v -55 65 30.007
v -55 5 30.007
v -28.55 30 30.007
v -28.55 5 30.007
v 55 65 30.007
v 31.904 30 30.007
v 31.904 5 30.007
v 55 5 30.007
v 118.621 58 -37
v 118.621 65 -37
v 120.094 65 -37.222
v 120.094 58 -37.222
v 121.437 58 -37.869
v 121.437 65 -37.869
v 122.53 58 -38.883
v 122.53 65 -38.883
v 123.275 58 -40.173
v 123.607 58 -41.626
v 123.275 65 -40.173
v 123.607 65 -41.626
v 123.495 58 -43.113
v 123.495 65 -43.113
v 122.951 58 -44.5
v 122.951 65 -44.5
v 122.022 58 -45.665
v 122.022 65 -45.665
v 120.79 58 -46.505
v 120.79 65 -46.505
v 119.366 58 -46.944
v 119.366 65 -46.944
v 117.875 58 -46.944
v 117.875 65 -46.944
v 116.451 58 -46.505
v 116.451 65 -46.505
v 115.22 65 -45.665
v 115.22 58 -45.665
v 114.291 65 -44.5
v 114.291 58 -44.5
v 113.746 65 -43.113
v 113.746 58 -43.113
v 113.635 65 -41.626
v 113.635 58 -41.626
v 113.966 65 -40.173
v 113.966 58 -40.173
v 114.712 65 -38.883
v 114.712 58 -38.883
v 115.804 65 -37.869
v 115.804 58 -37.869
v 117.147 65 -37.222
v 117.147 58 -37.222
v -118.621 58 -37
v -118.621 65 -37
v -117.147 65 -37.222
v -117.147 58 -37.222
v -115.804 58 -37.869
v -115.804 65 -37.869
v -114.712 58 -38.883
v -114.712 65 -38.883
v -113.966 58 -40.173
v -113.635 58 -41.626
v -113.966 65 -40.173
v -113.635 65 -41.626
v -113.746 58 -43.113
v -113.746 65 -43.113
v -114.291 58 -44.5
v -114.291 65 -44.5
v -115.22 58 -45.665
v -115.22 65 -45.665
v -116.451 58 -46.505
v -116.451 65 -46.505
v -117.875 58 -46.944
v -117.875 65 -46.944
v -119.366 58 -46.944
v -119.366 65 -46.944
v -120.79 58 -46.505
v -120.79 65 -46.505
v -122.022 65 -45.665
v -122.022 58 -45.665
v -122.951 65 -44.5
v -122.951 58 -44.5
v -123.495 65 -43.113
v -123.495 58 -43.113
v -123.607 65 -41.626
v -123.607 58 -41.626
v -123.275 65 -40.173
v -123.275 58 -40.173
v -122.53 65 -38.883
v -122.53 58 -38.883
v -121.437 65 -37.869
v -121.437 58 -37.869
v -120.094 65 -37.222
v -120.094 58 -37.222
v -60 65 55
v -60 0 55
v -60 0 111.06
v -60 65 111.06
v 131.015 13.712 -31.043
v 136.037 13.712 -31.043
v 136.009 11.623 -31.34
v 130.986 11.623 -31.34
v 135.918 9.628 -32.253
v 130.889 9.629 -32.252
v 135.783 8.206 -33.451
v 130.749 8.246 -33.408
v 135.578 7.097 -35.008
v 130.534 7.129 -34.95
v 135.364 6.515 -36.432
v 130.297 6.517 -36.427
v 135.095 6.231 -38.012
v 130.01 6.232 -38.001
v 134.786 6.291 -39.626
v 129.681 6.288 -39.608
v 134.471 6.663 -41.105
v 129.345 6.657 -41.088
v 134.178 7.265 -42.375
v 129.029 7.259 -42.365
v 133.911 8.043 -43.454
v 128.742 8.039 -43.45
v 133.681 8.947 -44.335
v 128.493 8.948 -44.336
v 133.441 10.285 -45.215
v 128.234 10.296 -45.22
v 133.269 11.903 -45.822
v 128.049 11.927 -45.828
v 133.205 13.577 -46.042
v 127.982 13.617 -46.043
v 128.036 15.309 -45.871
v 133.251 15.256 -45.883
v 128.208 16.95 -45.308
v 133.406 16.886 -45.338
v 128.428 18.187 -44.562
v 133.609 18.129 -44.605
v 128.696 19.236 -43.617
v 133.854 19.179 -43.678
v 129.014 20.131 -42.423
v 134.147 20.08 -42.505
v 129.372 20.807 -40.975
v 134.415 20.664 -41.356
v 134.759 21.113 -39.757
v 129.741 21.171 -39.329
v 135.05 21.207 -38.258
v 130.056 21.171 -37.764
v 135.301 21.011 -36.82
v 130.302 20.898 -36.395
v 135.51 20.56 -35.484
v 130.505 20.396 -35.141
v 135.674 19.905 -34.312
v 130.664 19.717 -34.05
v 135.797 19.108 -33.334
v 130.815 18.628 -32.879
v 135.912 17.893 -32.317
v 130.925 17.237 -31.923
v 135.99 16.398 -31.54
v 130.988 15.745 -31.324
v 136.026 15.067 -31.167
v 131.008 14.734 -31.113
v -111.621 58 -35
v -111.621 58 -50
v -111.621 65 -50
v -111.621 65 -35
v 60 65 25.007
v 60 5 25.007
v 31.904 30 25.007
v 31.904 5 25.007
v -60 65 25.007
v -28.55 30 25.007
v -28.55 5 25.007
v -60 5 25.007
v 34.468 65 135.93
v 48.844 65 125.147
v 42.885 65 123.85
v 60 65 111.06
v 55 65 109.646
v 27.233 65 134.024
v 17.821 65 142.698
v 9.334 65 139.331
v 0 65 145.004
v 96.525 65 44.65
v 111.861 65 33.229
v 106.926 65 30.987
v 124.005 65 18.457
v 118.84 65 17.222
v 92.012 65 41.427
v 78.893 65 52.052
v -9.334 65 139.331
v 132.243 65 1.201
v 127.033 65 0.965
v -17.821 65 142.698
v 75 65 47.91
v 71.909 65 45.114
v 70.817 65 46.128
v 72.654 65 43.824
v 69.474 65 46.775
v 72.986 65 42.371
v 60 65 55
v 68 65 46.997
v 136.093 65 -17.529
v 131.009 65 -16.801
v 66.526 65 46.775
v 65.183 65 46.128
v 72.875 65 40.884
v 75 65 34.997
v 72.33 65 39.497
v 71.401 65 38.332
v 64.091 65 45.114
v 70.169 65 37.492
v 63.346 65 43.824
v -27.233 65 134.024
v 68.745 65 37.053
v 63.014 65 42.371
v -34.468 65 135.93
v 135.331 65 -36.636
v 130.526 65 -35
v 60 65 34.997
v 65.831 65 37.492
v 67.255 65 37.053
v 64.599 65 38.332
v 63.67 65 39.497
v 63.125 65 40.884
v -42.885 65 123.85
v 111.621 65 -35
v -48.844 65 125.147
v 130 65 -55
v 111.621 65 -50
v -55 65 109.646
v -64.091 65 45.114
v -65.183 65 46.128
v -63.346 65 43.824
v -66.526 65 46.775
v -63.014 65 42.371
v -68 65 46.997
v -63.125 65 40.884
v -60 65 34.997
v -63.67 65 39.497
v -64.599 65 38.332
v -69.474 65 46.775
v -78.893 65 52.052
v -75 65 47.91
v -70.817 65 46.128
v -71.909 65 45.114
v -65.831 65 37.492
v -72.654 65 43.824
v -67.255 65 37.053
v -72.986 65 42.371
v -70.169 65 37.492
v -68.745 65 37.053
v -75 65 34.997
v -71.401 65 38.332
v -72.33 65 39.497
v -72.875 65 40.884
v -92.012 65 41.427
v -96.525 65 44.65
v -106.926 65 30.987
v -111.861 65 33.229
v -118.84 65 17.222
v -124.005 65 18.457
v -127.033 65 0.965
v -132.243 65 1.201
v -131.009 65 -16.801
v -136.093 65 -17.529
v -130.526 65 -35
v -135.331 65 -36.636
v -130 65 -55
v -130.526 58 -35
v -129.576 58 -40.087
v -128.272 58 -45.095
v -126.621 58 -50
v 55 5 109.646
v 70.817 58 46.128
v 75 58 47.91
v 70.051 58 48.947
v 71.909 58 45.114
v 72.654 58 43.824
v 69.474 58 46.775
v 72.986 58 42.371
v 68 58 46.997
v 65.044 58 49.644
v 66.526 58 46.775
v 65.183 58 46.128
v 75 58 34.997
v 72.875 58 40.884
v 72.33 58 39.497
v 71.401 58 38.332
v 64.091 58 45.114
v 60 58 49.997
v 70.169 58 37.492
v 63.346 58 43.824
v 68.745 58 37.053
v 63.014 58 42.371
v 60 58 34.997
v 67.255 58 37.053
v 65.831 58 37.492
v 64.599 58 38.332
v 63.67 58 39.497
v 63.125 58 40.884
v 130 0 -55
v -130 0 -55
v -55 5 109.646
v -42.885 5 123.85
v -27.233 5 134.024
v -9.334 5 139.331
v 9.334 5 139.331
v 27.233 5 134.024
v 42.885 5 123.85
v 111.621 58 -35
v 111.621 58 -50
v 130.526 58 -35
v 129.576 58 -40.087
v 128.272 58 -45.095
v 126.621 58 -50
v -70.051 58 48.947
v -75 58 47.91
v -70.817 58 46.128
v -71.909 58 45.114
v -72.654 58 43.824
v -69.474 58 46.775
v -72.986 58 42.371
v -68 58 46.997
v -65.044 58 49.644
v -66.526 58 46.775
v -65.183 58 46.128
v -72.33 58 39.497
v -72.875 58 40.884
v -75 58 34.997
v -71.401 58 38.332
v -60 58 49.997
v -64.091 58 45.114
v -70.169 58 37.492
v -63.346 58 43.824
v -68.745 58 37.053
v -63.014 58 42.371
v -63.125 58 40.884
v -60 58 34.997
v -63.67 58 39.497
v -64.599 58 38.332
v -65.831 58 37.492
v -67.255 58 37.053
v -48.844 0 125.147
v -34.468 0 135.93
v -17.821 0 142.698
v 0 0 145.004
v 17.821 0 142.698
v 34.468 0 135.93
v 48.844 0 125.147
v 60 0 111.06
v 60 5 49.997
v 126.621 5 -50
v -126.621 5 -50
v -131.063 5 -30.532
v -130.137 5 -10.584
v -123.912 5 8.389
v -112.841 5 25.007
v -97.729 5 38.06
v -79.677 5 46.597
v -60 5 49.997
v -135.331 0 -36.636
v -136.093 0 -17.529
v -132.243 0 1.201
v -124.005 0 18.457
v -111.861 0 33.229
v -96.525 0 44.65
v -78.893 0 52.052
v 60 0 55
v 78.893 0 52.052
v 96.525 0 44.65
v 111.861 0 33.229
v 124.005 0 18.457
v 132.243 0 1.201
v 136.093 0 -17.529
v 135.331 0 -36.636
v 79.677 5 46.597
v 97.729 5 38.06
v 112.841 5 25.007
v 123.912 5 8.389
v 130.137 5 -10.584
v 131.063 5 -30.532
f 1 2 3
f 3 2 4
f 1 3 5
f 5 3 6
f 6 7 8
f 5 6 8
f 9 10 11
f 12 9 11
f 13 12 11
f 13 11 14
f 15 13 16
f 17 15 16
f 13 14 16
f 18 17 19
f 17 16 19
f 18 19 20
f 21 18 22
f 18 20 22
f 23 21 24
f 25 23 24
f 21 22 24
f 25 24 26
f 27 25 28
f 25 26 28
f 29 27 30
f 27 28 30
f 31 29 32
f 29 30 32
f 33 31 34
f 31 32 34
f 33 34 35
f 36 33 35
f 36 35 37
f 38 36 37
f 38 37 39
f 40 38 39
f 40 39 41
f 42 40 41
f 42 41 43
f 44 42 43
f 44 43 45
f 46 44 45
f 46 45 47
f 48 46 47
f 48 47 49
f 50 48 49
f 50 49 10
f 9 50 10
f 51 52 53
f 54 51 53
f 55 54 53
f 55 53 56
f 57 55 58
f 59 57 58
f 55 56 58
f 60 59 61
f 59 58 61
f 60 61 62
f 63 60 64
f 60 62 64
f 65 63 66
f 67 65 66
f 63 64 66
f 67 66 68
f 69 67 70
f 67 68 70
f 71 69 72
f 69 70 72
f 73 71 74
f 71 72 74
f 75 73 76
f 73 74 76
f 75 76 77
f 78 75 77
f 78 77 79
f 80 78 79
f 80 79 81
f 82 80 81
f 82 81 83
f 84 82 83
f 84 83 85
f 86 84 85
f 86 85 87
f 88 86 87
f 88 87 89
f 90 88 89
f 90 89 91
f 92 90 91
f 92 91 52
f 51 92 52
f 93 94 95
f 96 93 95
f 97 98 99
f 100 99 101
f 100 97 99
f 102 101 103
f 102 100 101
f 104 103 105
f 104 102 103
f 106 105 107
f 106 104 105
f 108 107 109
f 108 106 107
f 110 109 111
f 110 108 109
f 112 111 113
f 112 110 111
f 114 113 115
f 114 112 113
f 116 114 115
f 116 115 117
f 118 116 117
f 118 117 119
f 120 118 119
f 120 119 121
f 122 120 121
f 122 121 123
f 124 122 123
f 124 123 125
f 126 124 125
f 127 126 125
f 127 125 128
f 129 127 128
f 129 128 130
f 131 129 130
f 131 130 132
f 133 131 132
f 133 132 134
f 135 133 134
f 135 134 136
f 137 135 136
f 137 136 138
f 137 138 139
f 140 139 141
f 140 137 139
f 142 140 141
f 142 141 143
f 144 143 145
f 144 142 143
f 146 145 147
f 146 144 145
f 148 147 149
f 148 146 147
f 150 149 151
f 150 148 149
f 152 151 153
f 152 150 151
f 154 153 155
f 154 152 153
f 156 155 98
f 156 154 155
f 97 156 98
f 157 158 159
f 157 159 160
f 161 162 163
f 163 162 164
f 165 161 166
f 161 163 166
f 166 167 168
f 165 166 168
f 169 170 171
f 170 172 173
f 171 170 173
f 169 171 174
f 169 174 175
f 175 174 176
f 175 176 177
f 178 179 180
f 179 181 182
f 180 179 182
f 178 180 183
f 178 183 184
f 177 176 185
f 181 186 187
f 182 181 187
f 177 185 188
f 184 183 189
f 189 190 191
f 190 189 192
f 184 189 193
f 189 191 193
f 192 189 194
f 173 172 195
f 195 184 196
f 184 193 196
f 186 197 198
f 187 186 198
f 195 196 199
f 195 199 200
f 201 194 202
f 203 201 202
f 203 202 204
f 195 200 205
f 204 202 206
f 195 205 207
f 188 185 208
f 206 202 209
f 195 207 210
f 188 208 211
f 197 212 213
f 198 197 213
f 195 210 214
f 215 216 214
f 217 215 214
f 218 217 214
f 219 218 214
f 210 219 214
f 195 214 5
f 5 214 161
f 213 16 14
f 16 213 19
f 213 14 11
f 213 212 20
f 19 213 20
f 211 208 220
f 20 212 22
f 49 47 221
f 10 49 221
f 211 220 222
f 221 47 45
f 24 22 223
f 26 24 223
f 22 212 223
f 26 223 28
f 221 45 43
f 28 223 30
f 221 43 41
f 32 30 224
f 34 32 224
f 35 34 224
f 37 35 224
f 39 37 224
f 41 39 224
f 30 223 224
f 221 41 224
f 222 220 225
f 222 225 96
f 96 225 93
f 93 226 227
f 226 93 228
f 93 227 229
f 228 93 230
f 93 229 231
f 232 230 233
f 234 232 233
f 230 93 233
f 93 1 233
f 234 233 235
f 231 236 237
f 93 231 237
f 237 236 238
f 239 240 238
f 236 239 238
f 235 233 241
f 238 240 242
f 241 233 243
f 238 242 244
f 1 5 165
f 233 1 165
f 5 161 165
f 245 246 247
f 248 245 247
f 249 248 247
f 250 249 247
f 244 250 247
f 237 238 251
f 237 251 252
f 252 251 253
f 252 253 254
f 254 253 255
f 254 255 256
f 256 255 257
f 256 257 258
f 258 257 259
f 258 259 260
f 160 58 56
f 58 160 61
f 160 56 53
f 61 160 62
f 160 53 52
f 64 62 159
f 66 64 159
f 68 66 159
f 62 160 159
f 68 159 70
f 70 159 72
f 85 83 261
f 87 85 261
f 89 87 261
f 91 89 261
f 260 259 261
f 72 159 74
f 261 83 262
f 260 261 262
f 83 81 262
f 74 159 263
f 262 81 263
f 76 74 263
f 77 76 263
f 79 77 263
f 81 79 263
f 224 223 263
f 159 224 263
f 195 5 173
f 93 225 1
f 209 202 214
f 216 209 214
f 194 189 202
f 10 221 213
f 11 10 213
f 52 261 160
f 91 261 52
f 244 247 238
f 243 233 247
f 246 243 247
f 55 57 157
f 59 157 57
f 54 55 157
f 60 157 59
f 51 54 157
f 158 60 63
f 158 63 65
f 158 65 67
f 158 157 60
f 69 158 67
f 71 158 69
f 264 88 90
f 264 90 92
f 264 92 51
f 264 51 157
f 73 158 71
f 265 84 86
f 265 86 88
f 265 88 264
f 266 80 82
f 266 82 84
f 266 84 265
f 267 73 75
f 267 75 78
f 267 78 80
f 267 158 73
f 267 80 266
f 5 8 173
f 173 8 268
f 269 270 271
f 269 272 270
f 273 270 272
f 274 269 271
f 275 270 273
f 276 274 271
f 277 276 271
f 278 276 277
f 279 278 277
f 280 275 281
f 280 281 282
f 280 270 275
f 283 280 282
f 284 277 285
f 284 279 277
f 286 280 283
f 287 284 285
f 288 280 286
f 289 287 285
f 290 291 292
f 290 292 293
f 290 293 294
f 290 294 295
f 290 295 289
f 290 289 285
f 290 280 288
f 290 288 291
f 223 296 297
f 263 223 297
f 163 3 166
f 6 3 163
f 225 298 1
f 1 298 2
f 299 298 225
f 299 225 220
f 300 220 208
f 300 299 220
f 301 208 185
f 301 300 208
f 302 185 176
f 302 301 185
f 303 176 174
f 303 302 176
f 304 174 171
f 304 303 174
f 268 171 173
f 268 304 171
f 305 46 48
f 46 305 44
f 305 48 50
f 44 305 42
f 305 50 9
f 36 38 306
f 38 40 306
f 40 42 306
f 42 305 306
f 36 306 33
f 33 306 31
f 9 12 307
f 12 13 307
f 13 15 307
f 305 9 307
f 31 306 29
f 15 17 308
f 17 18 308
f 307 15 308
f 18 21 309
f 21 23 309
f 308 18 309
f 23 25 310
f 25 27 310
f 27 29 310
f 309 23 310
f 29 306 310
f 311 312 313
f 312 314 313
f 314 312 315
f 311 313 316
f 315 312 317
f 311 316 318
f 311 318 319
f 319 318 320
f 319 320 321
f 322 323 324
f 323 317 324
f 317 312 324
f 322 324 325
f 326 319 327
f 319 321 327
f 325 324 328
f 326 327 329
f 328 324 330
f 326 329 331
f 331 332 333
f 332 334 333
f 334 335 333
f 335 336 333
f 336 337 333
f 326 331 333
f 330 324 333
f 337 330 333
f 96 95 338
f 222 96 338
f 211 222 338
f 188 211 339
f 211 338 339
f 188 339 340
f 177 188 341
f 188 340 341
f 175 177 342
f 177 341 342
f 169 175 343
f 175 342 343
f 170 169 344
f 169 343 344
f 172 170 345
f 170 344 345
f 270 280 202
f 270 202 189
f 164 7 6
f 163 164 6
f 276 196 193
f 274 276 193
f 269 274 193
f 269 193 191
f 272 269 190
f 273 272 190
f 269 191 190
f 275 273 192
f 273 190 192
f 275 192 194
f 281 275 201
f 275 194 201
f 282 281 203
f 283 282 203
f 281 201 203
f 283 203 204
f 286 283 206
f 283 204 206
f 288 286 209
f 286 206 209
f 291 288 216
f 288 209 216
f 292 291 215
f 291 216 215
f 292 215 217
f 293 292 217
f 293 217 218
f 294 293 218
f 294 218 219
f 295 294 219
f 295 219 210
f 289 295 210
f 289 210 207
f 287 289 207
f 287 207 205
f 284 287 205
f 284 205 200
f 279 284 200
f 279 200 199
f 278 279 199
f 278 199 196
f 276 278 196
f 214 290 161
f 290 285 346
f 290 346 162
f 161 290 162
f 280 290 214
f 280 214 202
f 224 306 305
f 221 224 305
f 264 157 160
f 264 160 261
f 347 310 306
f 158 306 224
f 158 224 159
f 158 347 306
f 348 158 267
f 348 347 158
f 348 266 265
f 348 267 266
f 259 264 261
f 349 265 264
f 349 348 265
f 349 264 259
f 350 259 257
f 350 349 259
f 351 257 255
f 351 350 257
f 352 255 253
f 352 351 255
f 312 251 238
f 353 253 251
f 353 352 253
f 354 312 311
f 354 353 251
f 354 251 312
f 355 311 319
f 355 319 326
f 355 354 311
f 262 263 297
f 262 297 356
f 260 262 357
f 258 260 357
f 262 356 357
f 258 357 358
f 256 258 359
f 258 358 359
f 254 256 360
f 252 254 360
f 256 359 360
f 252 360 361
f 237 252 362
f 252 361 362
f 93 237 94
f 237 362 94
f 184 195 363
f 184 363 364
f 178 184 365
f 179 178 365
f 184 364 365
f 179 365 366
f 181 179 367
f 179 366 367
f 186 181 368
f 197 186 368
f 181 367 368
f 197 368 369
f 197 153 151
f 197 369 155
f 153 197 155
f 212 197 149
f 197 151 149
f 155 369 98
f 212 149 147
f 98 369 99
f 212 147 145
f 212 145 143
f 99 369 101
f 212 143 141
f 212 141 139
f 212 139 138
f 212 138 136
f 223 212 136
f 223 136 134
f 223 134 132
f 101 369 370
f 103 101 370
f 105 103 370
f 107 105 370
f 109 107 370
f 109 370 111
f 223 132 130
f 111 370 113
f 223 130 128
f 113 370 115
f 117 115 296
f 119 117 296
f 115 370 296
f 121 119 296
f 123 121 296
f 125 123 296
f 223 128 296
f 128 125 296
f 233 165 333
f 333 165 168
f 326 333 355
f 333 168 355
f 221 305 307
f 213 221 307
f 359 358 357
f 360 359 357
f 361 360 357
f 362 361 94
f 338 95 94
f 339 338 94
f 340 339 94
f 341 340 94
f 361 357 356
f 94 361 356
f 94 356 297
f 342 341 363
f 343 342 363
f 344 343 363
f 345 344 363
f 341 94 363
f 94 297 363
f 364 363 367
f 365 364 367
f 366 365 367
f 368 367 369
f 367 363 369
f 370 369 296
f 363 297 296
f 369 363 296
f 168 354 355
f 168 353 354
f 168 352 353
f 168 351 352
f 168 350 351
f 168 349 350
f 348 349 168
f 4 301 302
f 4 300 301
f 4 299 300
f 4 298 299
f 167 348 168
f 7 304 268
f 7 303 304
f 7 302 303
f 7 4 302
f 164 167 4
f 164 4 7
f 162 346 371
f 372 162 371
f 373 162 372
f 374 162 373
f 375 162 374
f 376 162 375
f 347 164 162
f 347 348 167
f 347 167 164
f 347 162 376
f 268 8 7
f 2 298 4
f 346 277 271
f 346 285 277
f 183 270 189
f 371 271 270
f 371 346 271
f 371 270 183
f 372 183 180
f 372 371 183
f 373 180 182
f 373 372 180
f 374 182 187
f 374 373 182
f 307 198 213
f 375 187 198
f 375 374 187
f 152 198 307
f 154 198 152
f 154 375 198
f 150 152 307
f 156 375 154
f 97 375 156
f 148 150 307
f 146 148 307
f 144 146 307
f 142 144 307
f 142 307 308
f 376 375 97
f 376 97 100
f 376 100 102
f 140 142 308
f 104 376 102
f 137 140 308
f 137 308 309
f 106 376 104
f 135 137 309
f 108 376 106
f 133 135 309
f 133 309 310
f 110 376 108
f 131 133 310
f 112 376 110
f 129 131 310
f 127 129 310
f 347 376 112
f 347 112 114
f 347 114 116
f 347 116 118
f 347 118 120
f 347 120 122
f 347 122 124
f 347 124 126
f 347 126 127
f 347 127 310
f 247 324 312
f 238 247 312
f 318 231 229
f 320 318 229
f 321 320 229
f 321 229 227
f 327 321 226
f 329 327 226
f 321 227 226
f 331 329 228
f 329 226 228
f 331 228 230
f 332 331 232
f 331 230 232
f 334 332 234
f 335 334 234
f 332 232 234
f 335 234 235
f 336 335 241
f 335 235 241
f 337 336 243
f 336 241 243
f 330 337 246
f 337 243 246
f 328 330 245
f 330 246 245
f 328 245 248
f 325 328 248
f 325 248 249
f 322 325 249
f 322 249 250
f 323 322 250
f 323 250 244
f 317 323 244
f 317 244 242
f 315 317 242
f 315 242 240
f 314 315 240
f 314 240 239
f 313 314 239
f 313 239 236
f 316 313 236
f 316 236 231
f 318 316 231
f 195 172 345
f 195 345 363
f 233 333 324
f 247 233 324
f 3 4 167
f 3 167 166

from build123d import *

# Parameters (mm, degrees)
SALIENTE_EXTRUIR1_DEPTH    = 65
VACIADO1_T                 = -5
SALIENTE_EXTRUIR2_DEPTH    = 60
CROQUIS4_W                 = 60.454390592
CROQUIS4_H                 = 25
CORTAR_EXTRUIR1_DEPTH      = 65
CORTAR_EXTRUIR2_DEPTH      = 65
CORTAR_EXTRUIR2_DEPTH_BACK = 75
CROQUIS5_R                 = 7.5
SALIENTE_EXTRUIR3_START    = -7
SALIENTE_EXTRUIR3_DEPTH    = 7
SALIENTE_EXTRUIR5_START    = -7
SALIENTE_EXTRUIR5_DEPTH    = 7
SALIENTE_EXTRUIR7_START    = -7
SALIENTE_EXTRUIR7_DEPTH    = 7
SALIENTE_EXTRUIR8_START    = -7
SALIENTE_EXTRUIR8_DEPTH    = 7
CROQUIS12_R                = 5
CORTAR_EXTRUIR3_DEPTH      = 8


with BuildPart() as part:
    # Croquis2 → Saliente-Extruir1 (new body)
    with BuildSketch(Plane(origin=(0, 0, 0), x_dir=(1, 0, 0), z_dir=(0, 1, 0))):
        with BuildLine():
            ThreePointArc((60, -55), (124.004556318, -18.45744493), (130, 55))
            Line((130, 55), (-130, 55))
            ThreePointArc((-130, 55), (-124.004556318, -18.45744493), (-60, -55))
            Line((-60, -55), (-60, -111.06))
            ThreePointArc((-60, -111.06), (0, -145.004487245), (60, -111.06))
            Line((60, -111.06), (60, -55))
        make_face()
    extrude(amount=SALIENTE_EXTRUIR1_DEPTH)

    # Vaciado1
    vaciado1_openings = [part.faces().sort_by_distance(p)[0] for p in [
        (0, 65, 22.416037692),
    ]]
    offset(amount=VACIADO1_T, openings=vaciado1_openings, kind=Kind.INTERSECTION)

    # Croquis3 → Saliente-Extruir2 (add)
    with BuildSketch(Plane(origin=(0, 5, 0), x_dir=(1, 0, 0), z_dir=(0, 1, 0))):
        with BuildLine():
            ThreePointArc((-60, -49.997006185), (-57.500082648, -50.044139409), (-55, -50.006788897))
            Line((-55, -50.006788897), (-55, -30.006788897))
            Line((-55, -30.006788897), (55, -30.006788897))
            Line((55, -30.006788897), (55, -50.006788897))
            ThreePointArc((55, -50.006788897), (57.500082648, -50.044139409), (60, -49.997006185))
            Line((60, -49.997006185), (60, -25.006788897))
            Line((60, -25.006788897), (-60, -25.006788897))
            Line((-60, -25.006788897), (-60, -49.997006185))
        make_face()
    extrude(amount=SALIENTE_EXTRUIR2_DEPTH)

    # Croquis4 → Cortar-Extruir1 (cut)
    with BuildSketch(Plane.XY.offset(30.006788897)):
        with Locations((1.676963708, 17.5)):
            Rectangle(CROQUIS4_W, CROQUIS4_H)
    extrude(amount=-CORTAR_EXTRUIR1_DEPTH, mode=Mode.SUBTRACT)

    # Croquis5 → Cortar-Extruir2 (cut, two sides: drawn at the far end of the back side and taken through both)
    with BuildSketch(Plane(origin=(130, 0, 0), x_dir=(0, 0, -1), z_dir=(1, 0, 0)).offset(-CORTAR_EXTRUIR2_DEPTH_BACK)):
        with Locations(Location((38.54320604, 13.712018928, 0), (0, 0, 180))):
            Circle(CROQUIS5_R)
    extrude(amount=CORTAR_EXTRUIR2_DEPTH + CORTAR_EXTRUIR2_DEPTH_BACK, mode=Mode.SUBTRACT)

    # Croquis6 → Saliente-Extruir3 (add)
    with BuildSketch(Plane(origin=(0, 65, 0), x_dir=(1, 0, 0), z_dir=(0, 1, 0)).offset(SALIENTE_EXTRUIR3_START)):
        with BuildLine():
            Line((-126.620697254, 50), (-111.620697254, 50))
            Line((-111.620697254, 50), (-111.620697254, 35))
            Line((-111.620697254, 35), (-130.526494323, 35))
            ThreePointArc((-130.526494323, 35), (-128.967419464, 42.602546357), (-126.620697254, 50))
        make_face()
    extrude(amount=SALIENTE_EXTRUIR3_DEPTH)

    # Croquis8 → Saliente-Extruir5 (add)
    with BuildSketch(Plane(origin=(0, 65, 0), x_dir=(1, 0, 0), z_dir=(0, 1, 0)).offset(SALIENTE_EXTRUIR5_START)):
        with BuildLine():
            Line((126.620697254, 50), (111.620697254, 50))
            Line((111.620697254, 50), (111.620697254, 35))
            Line((111.620697254, 35), (130.526494323, 35))
            ThreePointArc((130.526494323, 35), (128.967419464, 42.602546357), (126.620697254, 50))
        make_face()
    extrude(amount=SALIENTE_EXTRUIR5_DEPTH)

    # Croquis10 → Saliente-Extruir7 (add)
    with BuildSketch(Plane(origin=(0, 65, 0), x_dir=(1, 0, 0), z_dir=(0, 1, 0)).offset(SALIENTE_EXTRUIR7_START)):
        with BuildLine():
            Line((-60, -49.997006185), (-60, -34.997006185))
            Line((-60, -34.997006185), (-75, -34.997006185))
            Line((-75, -34.997006185), (-75, -47.909881434))
            ThreePointArc((-75, -47.909881434), (-67.5535332, -49.338182668), (-60, -49.997006185))
        make_face()
    extrude(amount=SALIENTE_EXTRUIR7_DEPTH)

    # Croquis11 → Saliente-Extruir8 (add)
    with BuildSketch(Plane(origin=(0, 65, 0), x_dir=(1, 0, 0), z_dir=(0, 1, 0)).offset(SALIENTE_EXTRUIR8_START)):
        with BuildLine():
            Line((60, -49.997006185), (60, -34.997006185))
            Line((60, -34.997006185), (75, -34.997006185))
            Line((75, -34.997006185), (75, -47.909881434))
            ThreePointArc((75, -47.909881434), (67.5535332, -49.338182668), (60, -49.997006185))
        make_face()
    extrude(amount=SALIENTE_EXTRUIR8_DEPTH)

    # Croquis12 → Cortar-Extruir3 (cut)
    with BuildSketch(Plane(origin=(0, 65, 0), x_dir=(1, 0, 0), z_dir=(0, 1, 0))):
        with Locations(Location((-68, -41.997006185, 0), (0, 0, 270))):
            Circle(CROQUIS12_R)
        with Locations(Location((-118.620697254, 42, 0), (0, 0, 270))):
            Circle(CROQUIS12_R)
        with Locations(Location((118.620697254, 42, 0), (0, 0, 270))):
            Circle(CROQUIS12_R)
        with Locations(Location((68, -41.997006185, 0), (0, 0, 270))):
            Circle(CROQUIS12_R)
    extrude(amount=-CORTAR_EXTRUIR3_DEPTH, mode=Mode.SUBTRACT)


solid = part.part
